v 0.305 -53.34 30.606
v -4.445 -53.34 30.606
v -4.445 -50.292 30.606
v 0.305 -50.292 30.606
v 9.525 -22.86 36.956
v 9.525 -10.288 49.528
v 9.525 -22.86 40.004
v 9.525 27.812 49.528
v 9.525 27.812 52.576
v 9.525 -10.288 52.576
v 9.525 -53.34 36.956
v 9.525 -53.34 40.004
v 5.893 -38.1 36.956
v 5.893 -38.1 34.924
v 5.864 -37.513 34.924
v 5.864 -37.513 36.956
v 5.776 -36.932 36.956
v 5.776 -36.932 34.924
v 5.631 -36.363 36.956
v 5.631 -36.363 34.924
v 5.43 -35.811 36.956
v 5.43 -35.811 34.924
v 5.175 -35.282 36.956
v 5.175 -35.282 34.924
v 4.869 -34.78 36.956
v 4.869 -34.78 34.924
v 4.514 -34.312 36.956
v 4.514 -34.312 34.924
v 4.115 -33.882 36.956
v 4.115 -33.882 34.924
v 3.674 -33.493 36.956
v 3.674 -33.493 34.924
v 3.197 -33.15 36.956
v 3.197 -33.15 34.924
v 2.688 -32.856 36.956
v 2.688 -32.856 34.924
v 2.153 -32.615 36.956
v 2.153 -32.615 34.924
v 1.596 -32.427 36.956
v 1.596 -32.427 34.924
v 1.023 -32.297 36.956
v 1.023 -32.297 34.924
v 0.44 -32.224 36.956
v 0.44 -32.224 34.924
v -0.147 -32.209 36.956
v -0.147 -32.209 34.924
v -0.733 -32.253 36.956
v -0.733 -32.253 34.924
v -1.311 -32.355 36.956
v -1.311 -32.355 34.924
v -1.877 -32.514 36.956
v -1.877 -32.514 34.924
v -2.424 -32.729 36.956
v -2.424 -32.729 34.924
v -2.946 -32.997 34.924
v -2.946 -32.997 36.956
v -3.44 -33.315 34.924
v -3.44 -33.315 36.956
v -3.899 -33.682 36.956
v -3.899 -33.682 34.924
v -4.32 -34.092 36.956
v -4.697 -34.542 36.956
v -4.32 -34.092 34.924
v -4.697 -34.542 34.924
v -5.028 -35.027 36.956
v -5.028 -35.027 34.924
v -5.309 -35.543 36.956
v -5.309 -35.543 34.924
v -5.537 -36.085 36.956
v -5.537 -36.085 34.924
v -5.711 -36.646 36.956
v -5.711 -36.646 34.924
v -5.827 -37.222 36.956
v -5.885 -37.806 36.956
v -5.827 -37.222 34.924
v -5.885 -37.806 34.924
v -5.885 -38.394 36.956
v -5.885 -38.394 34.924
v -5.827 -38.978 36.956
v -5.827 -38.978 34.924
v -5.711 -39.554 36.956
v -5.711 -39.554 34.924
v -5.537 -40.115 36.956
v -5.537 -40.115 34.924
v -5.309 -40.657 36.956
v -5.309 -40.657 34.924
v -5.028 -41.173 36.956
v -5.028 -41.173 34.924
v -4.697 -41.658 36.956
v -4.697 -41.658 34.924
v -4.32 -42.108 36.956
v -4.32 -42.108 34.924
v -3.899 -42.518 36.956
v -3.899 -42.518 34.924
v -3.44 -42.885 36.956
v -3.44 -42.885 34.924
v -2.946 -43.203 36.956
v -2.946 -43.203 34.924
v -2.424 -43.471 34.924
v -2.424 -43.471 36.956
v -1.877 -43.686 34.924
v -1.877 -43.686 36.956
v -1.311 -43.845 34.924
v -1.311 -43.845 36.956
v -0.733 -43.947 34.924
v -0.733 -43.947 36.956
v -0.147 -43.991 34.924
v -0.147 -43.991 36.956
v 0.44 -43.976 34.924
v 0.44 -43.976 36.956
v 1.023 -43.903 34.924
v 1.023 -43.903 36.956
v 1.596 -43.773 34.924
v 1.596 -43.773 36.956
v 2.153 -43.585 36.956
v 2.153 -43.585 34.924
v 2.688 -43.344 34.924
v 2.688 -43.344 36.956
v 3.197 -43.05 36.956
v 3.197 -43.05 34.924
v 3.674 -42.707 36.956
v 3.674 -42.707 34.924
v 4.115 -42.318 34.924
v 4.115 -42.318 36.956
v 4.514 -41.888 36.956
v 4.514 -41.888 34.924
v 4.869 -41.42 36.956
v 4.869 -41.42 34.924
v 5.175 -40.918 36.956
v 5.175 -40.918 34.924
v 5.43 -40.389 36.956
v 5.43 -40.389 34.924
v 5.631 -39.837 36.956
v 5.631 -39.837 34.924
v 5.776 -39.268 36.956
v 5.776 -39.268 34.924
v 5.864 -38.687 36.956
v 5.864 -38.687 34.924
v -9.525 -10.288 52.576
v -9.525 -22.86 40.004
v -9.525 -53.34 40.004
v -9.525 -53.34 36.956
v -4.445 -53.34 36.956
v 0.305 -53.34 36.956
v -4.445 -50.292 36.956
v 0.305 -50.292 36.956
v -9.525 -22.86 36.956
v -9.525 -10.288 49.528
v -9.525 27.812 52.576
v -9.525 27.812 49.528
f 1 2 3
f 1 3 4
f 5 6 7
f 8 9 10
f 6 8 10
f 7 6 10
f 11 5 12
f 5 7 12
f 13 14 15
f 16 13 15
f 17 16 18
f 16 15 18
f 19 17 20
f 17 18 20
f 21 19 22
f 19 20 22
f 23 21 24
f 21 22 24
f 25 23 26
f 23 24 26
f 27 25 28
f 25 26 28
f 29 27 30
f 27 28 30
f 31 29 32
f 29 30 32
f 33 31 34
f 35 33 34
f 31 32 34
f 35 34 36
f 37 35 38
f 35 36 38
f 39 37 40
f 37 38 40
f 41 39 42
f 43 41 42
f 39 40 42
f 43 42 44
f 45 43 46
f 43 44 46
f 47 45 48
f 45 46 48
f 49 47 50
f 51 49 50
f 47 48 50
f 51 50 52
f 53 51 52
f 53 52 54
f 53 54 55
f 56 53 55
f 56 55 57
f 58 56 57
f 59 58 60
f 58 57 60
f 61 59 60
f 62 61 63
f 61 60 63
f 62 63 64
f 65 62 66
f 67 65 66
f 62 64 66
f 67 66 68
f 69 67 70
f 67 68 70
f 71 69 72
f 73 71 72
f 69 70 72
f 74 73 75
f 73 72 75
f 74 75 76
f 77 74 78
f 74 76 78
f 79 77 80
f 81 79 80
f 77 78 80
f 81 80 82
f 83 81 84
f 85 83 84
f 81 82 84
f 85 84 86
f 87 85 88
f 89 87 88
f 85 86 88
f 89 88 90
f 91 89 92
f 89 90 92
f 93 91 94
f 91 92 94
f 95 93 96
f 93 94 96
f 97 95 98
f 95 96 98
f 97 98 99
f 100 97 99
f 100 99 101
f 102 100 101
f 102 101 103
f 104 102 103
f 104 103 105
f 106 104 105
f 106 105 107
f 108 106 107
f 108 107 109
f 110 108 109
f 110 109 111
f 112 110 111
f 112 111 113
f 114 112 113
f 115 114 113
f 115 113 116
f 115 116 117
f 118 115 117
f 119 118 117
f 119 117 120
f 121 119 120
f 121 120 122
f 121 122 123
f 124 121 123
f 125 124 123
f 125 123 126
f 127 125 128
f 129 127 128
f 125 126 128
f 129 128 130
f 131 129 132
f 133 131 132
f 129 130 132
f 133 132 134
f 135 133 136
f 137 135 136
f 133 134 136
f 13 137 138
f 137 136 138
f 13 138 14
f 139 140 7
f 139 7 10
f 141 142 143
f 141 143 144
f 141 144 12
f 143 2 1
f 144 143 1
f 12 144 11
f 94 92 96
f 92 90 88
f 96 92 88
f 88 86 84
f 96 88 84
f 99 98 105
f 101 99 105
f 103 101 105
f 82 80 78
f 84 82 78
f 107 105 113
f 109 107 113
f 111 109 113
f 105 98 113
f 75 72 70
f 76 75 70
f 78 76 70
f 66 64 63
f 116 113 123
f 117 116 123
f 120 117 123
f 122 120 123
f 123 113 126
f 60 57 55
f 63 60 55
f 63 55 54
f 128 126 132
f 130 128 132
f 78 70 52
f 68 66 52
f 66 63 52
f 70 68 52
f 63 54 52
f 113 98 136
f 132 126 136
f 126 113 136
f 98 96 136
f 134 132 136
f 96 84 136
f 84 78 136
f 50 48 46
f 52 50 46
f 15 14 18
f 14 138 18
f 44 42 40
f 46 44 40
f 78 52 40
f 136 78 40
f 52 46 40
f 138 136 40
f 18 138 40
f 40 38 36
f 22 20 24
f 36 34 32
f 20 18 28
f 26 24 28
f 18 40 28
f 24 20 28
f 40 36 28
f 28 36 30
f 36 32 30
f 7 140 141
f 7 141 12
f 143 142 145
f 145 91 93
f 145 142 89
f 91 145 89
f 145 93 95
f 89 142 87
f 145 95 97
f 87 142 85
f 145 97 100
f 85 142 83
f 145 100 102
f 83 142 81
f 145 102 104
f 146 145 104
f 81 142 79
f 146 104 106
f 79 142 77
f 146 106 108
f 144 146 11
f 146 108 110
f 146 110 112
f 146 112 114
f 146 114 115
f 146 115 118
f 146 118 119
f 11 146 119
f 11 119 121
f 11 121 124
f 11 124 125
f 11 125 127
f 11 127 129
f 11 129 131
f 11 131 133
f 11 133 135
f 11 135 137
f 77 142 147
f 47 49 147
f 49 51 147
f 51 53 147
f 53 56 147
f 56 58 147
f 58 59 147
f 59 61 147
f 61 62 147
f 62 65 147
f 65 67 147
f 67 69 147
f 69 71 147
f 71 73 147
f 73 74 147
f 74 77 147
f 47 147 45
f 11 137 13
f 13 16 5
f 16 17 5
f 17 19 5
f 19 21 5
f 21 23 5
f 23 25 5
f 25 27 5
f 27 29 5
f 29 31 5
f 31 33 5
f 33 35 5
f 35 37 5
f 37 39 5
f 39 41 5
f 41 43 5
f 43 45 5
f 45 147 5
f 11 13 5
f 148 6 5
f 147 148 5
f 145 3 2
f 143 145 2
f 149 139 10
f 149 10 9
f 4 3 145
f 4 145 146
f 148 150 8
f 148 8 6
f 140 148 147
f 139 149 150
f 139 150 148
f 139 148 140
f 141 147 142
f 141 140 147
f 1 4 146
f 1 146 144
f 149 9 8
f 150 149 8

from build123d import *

# Parameters (mm, degrees)
CYLINDER003_R     = 5.8928
CYLINDER003_DEPTH = 2.032
SKETCH003_W       = 19.05
SKETCH003_H       = 30.48
PAD_DEPTH         = 3.048
PAD001_DEPTH      = 19.05
SKETCH005_W       = 4.7498
SKETCH005_H       = 3.048
PAD002_DEPTH      = 6.35


with BuildPart() as part:
    # Cylinder003 → Cylinder003 (new body)
    with BuildSketch(Plane(origin=(0, -38.1, 34.923527), x_dir=(1, 0, 0), z_dir=(0, 0, 1))):
        Circle(CYLINDER003_R)
    extrude(amount=CYLINDER003_DEPTH)

    # Sketch003 → Pad (new body)
    with BuildSketch(Plane(origin=(0, -38.1, 36.955527), x_dir=(1, 0, 0), z_dir=(0, 0, 1))):
        Rectangle(SKETCH003_W, SKETCH003_H)
    extrude(amount=PAD_DEPTH)

    # Sketch004 → Pad001 (new body)
    with BuildSketch(Plane(origin=(-9.525, -38.1, 34.923527), x_dir=(0, -1, 0), z_dir=(-1, 0, 0))):
        Polygon((-15.24, 5.08), (-27.812359, 17.652359), (-65.912359, 17.652359), (-65.912359, 14.604359), (-27.812359, 14.604359), (-15.24, 2.032), align=None)
    extrude(amount=-PAD001_DEPTH)

    # Sketch005 → Pad002 (new body)
    with BuildSketch(Plane(origin=(0, -38.1, 36.955527), x_dir=(1, 0, 0), z_dir=(0, 0, -1))):
        with Locations((-2.0701, 13.716)):
            Rectangle(SKETCH005_W, SKETCH005_H)
    extrude(amount=PAD002_DEPTH)


solid = part.part
